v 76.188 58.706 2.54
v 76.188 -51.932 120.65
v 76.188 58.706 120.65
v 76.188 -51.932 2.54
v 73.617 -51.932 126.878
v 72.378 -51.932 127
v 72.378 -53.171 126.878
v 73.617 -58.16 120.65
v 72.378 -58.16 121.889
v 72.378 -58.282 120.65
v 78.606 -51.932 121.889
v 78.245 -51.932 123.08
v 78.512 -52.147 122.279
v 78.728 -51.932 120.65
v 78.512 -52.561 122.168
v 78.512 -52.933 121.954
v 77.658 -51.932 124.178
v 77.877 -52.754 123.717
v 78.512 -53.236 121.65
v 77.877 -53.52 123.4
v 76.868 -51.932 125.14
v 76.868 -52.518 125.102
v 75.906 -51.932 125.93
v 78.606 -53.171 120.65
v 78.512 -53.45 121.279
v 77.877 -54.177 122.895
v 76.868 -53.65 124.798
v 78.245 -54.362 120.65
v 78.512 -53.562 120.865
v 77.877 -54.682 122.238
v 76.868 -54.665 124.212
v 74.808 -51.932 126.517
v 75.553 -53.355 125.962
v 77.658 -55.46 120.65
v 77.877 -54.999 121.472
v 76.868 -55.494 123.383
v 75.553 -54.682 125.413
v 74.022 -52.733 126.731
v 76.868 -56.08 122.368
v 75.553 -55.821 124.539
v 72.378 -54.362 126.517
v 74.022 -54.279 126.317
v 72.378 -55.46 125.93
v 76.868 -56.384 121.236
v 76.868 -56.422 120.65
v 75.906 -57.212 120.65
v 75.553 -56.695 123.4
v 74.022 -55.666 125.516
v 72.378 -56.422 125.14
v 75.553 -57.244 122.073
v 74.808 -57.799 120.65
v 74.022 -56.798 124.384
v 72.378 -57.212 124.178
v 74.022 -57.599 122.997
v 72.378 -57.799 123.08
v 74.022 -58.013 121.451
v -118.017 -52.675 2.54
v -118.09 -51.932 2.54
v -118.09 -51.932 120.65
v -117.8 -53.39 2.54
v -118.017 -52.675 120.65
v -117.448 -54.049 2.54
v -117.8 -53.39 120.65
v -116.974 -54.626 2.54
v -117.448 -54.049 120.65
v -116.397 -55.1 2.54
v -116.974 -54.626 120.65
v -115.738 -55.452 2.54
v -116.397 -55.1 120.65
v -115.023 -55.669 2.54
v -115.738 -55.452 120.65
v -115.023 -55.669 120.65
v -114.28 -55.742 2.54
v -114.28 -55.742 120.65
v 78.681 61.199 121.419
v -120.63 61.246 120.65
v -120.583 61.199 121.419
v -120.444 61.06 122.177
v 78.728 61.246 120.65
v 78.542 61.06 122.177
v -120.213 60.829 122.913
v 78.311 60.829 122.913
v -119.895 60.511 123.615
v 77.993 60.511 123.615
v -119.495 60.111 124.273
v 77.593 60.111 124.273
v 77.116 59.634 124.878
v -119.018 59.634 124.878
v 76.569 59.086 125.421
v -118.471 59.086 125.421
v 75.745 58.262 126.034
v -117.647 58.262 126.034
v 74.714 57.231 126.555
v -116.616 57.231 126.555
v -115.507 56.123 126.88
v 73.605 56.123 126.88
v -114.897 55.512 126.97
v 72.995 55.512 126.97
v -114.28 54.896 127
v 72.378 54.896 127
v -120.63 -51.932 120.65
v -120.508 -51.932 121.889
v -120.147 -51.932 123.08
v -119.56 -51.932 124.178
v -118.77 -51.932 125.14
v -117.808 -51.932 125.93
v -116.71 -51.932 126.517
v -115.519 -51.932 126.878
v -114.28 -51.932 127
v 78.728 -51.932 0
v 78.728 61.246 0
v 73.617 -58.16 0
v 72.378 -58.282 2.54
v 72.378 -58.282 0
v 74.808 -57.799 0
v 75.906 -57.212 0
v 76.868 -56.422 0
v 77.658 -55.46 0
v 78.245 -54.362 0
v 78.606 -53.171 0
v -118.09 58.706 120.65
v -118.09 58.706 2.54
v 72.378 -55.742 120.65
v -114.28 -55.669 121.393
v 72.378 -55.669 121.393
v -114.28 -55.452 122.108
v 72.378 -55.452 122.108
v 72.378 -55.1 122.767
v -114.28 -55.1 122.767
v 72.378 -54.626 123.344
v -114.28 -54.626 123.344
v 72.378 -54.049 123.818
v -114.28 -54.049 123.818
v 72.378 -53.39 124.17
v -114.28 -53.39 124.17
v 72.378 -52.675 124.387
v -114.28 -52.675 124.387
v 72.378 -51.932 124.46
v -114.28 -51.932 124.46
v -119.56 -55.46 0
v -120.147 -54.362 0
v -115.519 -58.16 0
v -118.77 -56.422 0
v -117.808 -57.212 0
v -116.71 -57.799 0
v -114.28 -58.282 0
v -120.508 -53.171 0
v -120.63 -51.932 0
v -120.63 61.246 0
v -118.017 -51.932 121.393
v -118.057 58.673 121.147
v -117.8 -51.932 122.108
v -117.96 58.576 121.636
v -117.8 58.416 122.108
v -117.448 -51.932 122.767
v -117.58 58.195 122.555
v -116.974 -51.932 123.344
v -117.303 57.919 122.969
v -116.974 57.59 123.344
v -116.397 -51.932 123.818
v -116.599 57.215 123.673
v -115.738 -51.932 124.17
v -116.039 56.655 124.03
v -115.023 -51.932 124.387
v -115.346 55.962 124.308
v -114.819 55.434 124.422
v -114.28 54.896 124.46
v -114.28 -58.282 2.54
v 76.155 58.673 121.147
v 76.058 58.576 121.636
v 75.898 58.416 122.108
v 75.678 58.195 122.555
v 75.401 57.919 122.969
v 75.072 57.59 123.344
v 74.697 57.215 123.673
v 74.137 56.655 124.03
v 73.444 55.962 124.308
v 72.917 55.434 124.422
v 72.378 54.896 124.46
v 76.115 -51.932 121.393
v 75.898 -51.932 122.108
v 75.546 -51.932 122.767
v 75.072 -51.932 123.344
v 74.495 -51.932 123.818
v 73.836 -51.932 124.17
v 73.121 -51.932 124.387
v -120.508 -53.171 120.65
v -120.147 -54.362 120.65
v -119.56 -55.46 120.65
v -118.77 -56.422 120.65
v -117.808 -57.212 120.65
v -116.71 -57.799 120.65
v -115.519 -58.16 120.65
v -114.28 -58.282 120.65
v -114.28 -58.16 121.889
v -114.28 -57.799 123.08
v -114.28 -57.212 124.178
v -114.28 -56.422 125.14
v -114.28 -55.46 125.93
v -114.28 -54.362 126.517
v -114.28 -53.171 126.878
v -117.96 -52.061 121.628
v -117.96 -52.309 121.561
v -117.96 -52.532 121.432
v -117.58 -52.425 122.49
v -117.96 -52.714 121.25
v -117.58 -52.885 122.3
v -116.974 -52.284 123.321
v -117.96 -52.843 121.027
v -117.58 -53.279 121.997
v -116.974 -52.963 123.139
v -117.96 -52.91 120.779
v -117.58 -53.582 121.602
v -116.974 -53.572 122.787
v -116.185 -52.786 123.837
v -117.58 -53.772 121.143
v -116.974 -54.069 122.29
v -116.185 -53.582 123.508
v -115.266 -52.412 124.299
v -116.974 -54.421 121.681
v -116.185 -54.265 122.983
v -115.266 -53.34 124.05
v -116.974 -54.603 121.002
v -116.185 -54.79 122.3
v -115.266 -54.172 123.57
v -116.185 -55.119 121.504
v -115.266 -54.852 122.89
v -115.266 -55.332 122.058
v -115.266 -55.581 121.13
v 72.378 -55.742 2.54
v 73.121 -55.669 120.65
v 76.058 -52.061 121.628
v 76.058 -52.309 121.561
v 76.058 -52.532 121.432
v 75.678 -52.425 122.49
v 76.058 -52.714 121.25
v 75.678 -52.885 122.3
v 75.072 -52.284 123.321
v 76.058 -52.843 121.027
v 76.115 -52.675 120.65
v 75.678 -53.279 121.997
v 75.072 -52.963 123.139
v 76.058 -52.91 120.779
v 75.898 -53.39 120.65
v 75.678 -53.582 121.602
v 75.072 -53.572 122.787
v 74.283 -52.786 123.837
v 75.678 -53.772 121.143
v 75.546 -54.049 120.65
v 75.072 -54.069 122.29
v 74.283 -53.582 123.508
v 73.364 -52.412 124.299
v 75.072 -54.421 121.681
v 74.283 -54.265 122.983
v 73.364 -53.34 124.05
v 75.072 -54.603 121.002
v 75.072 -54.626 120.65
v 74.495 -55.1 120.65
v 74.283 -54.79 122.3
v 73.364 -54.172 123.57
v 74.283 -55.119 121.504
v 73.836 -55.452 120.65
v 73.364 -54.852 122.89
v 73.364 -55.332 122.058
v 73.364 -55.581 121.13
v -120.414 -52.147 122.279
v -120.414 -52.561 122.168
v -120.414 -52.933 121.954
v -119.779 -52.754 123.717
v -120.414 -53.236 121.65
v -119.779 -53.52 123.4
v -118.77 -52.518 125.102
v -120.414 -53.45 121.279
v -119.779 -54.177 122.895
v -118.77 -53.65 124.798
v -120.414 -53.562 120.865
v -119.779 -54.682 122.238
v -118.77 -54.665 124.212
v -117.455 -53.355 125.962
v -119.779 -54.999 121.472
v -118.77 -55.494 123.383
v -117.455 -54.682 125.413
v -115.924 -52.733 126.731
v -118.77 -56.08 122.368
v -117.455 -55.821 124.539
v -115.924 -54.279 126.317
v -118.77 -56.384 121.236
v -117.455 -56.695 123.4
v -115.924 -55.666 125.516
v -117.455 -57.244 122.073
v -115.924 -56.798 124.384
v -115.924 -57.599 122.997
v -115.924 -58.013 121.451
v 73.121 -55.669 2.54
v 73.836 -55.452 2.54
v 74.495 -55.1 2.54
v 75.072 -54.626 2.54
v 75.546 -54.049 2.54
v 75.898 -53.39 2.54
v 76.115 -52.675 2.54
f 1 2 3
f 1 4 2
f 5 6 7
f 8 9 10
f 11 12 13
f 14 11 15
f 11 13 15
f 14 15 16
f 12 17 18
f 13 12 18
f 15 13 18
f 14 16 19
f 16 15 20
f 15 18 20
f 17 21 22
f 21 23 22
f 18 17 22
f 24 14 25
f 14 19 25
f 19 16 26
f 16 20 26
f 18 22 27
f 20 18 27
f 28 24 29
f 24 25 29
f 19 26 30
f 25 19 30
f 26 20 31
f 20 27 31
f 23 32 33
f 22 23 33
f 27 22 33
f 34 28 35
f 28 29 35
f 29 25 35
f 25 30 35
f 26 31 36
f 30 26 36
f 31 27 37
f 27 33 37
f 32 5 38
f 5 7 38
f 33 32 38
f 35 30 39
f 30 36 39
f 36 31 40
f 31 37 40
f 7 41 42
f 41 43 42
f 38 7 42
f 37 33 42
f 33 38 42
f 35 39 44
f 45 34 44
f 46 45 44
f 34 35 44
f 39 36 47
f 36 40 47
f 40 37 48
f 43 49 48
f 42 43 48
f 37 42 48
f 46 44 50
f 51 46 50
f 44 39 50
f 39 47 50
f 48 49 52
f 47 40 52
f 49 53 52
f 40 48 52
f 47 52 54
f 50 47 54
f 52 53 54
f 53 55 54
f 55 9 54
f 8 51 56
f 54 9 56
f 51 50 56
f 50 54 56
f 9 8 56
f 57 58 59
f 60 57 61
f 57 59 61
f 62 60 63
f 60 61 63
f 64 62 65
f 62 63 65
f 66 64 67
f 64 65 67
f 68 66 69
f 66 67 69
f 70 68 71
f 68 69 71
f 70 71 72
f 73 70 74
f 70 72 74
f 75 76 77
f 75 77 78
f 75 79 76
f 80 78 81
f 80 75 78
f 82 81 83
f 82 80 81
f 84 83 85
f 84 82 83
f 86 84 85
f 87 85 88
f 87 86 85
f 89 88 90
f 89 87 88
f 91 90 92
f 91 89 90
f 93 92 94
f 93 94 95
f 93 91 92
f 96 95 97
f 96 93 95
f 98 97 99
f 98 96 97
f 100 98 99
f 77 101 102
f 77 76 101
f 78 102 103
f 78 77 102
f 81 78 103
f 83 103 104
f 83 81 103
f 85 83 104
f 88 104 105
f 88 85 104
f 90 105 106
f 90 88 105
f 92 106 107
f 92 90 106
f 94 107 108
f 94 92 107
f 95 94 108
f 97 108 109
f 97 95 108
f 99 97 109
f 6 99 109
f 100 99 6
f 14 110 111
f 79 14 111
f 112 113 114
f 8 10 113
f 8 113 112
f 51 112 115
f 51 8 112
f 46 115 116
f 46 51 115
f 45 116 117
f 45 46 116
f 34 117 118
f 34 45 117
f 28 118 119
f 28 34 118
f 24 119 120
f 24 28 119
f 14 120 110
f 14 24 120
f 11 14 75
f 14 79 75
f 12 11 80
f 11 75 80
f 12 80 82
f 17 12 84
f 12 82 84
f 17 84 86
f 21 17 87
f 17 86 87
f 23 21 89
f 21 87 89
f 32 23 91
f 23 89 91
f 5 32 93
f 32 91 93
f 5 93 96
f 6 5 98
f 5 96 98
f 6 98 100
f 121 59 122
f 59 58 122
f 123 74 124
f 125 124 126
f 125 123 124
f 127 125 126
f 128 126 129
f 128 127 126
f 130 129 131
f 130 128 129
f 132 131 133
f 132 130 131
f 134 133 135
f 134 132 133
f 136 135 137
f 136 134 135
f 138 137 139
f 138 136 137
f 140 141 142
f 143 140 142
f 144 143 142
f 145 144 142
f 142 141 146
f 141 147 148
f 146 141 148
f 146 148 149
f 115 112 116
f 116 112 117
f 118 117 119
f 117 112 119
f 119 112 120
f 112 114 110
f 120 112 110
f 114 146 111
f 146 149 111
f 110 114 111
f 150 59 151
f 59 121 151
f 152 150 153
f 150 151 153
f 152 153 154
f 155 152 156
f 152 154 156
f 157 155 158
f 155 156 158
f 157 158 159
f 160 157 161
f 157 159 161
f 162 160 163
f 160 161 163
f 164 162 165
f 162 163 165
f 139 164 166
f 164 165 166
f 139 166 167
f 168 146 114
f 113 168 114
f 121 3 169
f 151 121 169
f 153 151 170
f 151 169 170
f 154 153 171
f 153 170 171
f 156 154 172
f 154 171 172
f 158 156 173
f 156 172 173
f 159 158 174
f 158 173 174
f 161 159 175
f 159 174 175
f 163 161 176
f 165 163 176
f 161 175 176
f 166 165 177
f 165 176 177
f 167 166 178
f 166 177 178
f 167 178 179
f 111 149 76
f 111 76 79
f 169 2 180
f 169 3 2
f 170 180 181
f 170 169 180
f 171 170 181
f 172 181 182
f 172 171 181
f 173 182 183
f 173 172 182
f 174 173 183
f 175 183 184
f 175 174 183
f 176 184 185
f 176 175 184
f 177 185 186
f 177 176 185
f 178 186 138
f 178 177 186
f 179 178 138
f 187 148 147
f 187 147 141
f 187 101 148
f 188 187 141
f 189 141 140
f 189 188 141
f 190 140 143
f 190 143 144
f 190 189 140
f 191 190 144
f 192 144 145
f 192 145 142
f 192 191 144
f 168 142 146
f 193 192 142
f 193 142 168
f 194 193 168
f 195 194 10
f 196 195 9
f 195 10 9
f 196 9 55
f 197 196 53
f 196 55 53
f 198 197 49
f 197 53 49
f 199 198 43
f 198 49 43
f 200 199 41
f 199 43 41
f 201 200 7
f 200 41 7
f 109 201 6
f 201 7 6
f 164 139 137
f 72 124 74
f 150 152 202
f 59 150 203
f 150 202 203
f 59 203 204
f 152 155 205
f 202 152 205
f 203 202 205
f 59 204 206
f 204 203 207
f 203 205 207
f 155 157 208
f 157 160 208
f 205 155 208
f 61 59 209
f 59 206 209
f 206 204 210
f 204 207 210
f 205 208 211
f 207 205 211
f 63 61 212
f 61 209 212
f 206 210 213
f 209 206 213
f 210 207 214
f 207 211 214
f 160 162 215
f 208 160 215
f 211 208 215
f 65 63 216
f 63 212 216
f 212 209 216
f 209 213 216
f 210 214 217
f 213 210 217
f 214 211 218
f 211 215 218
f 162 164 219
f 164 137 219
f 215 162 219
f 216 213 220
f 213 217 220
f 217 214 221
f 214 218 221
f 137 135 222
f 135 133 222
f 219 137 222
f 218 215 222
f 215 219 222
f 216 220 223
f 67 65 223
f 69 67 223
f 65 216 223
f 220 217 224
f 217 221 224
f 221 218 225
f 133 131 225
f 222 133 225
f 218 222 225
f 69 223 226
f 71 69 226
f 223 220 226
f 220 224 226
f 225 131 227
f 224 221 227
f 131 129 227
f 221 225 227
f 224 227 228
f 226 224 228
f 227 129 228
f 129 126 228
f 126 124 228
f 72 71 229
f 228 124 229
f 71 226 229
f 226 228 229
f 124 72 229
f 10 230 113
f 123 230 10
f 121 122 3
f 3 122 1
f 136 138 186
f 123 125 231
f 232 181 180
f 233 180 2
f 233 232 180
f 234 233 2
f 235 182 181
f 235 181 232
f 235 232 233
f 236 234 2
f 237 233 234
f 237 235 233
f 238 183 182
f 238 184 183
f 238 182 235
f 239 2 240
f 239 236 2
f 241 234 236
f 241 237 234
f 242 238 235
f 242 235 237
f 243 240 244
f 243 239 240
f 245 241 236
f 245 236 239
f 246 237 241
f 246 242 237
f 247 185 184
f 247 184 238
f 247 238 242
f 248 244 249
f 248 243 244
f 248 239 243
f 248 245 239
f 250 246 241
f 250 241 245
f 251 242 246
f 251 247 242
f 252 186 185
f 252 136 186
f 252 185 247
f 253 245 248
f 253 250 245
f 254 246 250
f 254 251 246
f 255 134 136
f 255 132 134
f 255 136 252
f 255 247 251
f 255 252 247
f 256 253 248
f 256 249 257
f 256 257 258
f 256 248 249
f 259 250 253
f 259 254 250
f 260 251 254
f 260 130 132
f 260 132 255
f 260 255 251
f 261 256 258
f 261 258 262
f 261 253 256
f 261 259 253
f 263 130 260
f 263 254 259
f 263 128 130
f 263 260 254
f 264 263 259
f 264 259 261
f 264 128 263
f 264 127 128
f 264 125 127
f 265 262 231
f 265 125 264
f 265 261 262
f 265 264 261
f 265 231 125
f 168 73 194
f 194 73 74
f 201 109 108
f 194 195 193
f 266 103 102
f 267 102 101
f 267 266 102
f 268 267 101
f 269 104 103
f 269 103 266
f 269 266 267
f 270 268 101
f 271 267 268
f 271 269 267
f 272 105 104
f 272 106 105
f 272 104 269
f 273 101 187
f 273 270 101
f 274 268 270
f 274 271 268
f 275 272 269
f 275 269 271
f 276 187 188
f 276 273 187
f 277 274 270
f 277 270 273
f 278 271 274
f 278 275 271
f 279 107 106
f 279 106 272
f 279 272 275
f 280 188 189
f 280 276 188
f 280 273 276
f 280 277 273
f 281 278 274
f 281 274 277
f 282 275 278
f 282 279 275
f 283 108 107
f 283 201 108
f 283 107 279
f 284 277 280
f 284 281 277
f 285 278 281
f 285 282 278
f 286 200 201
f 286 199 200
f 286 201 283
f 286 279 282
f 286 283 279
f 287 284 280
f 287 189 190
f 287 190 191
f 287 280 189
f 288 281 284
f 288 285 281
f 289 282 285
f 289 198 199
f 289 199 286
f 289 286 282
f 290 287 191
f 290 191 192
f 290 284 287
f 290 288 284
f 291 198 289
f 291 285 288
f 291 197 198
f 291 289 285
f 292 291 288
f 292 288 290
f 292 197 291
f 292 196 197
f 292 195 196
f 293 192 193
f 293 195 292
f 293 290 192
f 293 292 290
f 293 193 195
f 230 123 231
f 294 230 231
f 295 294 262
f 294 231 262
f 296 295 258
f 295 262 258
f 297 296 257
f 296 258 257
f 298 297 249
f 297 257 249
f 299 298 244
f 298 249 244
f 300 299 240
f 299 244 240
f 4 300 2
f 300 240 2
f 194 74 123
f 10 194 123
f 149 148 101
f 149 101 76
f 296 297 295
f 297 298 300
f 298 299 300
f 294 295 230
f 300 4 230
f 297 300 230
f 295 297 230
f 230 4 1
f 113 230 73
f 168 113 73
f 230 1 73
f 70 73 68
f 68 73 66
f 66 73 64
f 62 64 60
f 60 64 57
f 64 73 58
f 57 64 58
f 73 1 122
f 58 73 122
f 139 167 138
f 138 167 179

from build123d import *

# Parameters (mm, degrees)
F0_W     = 199.3581205606
F0_H     = 119.528003037
F1_DEPTH = 127
F2_R     = 6.35
F3_T     = -2.54


# Not quite as in the source:
# - a shell that OpenCascade refuses in one call is made with other operations: the cavity is built on its own and cut out


with BuildPart() as f1:
    # F0 (on Top) → F1 (new body)
    with BuildSketch(Plane.XY):
        with Locations((-20.9509953856, 1.4819204807)):
            Rectangle(F0_W, F0_H)
    extrude(amount=F1_DEPTH)

    # F2
    f2_edges = [f1.edges().sort_by_distance(p)[0] for p in [
        (-20.950995, -58.282081, 127),
        (78.728065, 1.48192, 127),
        (-20.950995, 61.245922, 127),
        (-120.630056, 1.48192, 127),
        (-120.630056, -58.282081, 63.5),
        (78.728065, -58.282081, 63.5),
    ]]
    fillet(f2_edges, radius=F2_R)

    # F3: a shell. OpenCascade refuses it in one call, so the cavity is built on its own and cut out:
    # the body offset inwards by the wall thickness, plus a prism from it out through each open face.
    f3_core = offset(f1.part, amount=F3_T, mode=Mode.PRIVATE)
    f3_exits = [f3_core.faces().sort_by_distance(p)[0] for p in [
        (-20.950995, -55.742081, 61.595),
    ]]
    add(f3_core, mode=Mode.SUBTRACT)
    extrude(f3_exits, amount=-F3_T, mode=Mode.SUBTRACT)


solid = f1.part
